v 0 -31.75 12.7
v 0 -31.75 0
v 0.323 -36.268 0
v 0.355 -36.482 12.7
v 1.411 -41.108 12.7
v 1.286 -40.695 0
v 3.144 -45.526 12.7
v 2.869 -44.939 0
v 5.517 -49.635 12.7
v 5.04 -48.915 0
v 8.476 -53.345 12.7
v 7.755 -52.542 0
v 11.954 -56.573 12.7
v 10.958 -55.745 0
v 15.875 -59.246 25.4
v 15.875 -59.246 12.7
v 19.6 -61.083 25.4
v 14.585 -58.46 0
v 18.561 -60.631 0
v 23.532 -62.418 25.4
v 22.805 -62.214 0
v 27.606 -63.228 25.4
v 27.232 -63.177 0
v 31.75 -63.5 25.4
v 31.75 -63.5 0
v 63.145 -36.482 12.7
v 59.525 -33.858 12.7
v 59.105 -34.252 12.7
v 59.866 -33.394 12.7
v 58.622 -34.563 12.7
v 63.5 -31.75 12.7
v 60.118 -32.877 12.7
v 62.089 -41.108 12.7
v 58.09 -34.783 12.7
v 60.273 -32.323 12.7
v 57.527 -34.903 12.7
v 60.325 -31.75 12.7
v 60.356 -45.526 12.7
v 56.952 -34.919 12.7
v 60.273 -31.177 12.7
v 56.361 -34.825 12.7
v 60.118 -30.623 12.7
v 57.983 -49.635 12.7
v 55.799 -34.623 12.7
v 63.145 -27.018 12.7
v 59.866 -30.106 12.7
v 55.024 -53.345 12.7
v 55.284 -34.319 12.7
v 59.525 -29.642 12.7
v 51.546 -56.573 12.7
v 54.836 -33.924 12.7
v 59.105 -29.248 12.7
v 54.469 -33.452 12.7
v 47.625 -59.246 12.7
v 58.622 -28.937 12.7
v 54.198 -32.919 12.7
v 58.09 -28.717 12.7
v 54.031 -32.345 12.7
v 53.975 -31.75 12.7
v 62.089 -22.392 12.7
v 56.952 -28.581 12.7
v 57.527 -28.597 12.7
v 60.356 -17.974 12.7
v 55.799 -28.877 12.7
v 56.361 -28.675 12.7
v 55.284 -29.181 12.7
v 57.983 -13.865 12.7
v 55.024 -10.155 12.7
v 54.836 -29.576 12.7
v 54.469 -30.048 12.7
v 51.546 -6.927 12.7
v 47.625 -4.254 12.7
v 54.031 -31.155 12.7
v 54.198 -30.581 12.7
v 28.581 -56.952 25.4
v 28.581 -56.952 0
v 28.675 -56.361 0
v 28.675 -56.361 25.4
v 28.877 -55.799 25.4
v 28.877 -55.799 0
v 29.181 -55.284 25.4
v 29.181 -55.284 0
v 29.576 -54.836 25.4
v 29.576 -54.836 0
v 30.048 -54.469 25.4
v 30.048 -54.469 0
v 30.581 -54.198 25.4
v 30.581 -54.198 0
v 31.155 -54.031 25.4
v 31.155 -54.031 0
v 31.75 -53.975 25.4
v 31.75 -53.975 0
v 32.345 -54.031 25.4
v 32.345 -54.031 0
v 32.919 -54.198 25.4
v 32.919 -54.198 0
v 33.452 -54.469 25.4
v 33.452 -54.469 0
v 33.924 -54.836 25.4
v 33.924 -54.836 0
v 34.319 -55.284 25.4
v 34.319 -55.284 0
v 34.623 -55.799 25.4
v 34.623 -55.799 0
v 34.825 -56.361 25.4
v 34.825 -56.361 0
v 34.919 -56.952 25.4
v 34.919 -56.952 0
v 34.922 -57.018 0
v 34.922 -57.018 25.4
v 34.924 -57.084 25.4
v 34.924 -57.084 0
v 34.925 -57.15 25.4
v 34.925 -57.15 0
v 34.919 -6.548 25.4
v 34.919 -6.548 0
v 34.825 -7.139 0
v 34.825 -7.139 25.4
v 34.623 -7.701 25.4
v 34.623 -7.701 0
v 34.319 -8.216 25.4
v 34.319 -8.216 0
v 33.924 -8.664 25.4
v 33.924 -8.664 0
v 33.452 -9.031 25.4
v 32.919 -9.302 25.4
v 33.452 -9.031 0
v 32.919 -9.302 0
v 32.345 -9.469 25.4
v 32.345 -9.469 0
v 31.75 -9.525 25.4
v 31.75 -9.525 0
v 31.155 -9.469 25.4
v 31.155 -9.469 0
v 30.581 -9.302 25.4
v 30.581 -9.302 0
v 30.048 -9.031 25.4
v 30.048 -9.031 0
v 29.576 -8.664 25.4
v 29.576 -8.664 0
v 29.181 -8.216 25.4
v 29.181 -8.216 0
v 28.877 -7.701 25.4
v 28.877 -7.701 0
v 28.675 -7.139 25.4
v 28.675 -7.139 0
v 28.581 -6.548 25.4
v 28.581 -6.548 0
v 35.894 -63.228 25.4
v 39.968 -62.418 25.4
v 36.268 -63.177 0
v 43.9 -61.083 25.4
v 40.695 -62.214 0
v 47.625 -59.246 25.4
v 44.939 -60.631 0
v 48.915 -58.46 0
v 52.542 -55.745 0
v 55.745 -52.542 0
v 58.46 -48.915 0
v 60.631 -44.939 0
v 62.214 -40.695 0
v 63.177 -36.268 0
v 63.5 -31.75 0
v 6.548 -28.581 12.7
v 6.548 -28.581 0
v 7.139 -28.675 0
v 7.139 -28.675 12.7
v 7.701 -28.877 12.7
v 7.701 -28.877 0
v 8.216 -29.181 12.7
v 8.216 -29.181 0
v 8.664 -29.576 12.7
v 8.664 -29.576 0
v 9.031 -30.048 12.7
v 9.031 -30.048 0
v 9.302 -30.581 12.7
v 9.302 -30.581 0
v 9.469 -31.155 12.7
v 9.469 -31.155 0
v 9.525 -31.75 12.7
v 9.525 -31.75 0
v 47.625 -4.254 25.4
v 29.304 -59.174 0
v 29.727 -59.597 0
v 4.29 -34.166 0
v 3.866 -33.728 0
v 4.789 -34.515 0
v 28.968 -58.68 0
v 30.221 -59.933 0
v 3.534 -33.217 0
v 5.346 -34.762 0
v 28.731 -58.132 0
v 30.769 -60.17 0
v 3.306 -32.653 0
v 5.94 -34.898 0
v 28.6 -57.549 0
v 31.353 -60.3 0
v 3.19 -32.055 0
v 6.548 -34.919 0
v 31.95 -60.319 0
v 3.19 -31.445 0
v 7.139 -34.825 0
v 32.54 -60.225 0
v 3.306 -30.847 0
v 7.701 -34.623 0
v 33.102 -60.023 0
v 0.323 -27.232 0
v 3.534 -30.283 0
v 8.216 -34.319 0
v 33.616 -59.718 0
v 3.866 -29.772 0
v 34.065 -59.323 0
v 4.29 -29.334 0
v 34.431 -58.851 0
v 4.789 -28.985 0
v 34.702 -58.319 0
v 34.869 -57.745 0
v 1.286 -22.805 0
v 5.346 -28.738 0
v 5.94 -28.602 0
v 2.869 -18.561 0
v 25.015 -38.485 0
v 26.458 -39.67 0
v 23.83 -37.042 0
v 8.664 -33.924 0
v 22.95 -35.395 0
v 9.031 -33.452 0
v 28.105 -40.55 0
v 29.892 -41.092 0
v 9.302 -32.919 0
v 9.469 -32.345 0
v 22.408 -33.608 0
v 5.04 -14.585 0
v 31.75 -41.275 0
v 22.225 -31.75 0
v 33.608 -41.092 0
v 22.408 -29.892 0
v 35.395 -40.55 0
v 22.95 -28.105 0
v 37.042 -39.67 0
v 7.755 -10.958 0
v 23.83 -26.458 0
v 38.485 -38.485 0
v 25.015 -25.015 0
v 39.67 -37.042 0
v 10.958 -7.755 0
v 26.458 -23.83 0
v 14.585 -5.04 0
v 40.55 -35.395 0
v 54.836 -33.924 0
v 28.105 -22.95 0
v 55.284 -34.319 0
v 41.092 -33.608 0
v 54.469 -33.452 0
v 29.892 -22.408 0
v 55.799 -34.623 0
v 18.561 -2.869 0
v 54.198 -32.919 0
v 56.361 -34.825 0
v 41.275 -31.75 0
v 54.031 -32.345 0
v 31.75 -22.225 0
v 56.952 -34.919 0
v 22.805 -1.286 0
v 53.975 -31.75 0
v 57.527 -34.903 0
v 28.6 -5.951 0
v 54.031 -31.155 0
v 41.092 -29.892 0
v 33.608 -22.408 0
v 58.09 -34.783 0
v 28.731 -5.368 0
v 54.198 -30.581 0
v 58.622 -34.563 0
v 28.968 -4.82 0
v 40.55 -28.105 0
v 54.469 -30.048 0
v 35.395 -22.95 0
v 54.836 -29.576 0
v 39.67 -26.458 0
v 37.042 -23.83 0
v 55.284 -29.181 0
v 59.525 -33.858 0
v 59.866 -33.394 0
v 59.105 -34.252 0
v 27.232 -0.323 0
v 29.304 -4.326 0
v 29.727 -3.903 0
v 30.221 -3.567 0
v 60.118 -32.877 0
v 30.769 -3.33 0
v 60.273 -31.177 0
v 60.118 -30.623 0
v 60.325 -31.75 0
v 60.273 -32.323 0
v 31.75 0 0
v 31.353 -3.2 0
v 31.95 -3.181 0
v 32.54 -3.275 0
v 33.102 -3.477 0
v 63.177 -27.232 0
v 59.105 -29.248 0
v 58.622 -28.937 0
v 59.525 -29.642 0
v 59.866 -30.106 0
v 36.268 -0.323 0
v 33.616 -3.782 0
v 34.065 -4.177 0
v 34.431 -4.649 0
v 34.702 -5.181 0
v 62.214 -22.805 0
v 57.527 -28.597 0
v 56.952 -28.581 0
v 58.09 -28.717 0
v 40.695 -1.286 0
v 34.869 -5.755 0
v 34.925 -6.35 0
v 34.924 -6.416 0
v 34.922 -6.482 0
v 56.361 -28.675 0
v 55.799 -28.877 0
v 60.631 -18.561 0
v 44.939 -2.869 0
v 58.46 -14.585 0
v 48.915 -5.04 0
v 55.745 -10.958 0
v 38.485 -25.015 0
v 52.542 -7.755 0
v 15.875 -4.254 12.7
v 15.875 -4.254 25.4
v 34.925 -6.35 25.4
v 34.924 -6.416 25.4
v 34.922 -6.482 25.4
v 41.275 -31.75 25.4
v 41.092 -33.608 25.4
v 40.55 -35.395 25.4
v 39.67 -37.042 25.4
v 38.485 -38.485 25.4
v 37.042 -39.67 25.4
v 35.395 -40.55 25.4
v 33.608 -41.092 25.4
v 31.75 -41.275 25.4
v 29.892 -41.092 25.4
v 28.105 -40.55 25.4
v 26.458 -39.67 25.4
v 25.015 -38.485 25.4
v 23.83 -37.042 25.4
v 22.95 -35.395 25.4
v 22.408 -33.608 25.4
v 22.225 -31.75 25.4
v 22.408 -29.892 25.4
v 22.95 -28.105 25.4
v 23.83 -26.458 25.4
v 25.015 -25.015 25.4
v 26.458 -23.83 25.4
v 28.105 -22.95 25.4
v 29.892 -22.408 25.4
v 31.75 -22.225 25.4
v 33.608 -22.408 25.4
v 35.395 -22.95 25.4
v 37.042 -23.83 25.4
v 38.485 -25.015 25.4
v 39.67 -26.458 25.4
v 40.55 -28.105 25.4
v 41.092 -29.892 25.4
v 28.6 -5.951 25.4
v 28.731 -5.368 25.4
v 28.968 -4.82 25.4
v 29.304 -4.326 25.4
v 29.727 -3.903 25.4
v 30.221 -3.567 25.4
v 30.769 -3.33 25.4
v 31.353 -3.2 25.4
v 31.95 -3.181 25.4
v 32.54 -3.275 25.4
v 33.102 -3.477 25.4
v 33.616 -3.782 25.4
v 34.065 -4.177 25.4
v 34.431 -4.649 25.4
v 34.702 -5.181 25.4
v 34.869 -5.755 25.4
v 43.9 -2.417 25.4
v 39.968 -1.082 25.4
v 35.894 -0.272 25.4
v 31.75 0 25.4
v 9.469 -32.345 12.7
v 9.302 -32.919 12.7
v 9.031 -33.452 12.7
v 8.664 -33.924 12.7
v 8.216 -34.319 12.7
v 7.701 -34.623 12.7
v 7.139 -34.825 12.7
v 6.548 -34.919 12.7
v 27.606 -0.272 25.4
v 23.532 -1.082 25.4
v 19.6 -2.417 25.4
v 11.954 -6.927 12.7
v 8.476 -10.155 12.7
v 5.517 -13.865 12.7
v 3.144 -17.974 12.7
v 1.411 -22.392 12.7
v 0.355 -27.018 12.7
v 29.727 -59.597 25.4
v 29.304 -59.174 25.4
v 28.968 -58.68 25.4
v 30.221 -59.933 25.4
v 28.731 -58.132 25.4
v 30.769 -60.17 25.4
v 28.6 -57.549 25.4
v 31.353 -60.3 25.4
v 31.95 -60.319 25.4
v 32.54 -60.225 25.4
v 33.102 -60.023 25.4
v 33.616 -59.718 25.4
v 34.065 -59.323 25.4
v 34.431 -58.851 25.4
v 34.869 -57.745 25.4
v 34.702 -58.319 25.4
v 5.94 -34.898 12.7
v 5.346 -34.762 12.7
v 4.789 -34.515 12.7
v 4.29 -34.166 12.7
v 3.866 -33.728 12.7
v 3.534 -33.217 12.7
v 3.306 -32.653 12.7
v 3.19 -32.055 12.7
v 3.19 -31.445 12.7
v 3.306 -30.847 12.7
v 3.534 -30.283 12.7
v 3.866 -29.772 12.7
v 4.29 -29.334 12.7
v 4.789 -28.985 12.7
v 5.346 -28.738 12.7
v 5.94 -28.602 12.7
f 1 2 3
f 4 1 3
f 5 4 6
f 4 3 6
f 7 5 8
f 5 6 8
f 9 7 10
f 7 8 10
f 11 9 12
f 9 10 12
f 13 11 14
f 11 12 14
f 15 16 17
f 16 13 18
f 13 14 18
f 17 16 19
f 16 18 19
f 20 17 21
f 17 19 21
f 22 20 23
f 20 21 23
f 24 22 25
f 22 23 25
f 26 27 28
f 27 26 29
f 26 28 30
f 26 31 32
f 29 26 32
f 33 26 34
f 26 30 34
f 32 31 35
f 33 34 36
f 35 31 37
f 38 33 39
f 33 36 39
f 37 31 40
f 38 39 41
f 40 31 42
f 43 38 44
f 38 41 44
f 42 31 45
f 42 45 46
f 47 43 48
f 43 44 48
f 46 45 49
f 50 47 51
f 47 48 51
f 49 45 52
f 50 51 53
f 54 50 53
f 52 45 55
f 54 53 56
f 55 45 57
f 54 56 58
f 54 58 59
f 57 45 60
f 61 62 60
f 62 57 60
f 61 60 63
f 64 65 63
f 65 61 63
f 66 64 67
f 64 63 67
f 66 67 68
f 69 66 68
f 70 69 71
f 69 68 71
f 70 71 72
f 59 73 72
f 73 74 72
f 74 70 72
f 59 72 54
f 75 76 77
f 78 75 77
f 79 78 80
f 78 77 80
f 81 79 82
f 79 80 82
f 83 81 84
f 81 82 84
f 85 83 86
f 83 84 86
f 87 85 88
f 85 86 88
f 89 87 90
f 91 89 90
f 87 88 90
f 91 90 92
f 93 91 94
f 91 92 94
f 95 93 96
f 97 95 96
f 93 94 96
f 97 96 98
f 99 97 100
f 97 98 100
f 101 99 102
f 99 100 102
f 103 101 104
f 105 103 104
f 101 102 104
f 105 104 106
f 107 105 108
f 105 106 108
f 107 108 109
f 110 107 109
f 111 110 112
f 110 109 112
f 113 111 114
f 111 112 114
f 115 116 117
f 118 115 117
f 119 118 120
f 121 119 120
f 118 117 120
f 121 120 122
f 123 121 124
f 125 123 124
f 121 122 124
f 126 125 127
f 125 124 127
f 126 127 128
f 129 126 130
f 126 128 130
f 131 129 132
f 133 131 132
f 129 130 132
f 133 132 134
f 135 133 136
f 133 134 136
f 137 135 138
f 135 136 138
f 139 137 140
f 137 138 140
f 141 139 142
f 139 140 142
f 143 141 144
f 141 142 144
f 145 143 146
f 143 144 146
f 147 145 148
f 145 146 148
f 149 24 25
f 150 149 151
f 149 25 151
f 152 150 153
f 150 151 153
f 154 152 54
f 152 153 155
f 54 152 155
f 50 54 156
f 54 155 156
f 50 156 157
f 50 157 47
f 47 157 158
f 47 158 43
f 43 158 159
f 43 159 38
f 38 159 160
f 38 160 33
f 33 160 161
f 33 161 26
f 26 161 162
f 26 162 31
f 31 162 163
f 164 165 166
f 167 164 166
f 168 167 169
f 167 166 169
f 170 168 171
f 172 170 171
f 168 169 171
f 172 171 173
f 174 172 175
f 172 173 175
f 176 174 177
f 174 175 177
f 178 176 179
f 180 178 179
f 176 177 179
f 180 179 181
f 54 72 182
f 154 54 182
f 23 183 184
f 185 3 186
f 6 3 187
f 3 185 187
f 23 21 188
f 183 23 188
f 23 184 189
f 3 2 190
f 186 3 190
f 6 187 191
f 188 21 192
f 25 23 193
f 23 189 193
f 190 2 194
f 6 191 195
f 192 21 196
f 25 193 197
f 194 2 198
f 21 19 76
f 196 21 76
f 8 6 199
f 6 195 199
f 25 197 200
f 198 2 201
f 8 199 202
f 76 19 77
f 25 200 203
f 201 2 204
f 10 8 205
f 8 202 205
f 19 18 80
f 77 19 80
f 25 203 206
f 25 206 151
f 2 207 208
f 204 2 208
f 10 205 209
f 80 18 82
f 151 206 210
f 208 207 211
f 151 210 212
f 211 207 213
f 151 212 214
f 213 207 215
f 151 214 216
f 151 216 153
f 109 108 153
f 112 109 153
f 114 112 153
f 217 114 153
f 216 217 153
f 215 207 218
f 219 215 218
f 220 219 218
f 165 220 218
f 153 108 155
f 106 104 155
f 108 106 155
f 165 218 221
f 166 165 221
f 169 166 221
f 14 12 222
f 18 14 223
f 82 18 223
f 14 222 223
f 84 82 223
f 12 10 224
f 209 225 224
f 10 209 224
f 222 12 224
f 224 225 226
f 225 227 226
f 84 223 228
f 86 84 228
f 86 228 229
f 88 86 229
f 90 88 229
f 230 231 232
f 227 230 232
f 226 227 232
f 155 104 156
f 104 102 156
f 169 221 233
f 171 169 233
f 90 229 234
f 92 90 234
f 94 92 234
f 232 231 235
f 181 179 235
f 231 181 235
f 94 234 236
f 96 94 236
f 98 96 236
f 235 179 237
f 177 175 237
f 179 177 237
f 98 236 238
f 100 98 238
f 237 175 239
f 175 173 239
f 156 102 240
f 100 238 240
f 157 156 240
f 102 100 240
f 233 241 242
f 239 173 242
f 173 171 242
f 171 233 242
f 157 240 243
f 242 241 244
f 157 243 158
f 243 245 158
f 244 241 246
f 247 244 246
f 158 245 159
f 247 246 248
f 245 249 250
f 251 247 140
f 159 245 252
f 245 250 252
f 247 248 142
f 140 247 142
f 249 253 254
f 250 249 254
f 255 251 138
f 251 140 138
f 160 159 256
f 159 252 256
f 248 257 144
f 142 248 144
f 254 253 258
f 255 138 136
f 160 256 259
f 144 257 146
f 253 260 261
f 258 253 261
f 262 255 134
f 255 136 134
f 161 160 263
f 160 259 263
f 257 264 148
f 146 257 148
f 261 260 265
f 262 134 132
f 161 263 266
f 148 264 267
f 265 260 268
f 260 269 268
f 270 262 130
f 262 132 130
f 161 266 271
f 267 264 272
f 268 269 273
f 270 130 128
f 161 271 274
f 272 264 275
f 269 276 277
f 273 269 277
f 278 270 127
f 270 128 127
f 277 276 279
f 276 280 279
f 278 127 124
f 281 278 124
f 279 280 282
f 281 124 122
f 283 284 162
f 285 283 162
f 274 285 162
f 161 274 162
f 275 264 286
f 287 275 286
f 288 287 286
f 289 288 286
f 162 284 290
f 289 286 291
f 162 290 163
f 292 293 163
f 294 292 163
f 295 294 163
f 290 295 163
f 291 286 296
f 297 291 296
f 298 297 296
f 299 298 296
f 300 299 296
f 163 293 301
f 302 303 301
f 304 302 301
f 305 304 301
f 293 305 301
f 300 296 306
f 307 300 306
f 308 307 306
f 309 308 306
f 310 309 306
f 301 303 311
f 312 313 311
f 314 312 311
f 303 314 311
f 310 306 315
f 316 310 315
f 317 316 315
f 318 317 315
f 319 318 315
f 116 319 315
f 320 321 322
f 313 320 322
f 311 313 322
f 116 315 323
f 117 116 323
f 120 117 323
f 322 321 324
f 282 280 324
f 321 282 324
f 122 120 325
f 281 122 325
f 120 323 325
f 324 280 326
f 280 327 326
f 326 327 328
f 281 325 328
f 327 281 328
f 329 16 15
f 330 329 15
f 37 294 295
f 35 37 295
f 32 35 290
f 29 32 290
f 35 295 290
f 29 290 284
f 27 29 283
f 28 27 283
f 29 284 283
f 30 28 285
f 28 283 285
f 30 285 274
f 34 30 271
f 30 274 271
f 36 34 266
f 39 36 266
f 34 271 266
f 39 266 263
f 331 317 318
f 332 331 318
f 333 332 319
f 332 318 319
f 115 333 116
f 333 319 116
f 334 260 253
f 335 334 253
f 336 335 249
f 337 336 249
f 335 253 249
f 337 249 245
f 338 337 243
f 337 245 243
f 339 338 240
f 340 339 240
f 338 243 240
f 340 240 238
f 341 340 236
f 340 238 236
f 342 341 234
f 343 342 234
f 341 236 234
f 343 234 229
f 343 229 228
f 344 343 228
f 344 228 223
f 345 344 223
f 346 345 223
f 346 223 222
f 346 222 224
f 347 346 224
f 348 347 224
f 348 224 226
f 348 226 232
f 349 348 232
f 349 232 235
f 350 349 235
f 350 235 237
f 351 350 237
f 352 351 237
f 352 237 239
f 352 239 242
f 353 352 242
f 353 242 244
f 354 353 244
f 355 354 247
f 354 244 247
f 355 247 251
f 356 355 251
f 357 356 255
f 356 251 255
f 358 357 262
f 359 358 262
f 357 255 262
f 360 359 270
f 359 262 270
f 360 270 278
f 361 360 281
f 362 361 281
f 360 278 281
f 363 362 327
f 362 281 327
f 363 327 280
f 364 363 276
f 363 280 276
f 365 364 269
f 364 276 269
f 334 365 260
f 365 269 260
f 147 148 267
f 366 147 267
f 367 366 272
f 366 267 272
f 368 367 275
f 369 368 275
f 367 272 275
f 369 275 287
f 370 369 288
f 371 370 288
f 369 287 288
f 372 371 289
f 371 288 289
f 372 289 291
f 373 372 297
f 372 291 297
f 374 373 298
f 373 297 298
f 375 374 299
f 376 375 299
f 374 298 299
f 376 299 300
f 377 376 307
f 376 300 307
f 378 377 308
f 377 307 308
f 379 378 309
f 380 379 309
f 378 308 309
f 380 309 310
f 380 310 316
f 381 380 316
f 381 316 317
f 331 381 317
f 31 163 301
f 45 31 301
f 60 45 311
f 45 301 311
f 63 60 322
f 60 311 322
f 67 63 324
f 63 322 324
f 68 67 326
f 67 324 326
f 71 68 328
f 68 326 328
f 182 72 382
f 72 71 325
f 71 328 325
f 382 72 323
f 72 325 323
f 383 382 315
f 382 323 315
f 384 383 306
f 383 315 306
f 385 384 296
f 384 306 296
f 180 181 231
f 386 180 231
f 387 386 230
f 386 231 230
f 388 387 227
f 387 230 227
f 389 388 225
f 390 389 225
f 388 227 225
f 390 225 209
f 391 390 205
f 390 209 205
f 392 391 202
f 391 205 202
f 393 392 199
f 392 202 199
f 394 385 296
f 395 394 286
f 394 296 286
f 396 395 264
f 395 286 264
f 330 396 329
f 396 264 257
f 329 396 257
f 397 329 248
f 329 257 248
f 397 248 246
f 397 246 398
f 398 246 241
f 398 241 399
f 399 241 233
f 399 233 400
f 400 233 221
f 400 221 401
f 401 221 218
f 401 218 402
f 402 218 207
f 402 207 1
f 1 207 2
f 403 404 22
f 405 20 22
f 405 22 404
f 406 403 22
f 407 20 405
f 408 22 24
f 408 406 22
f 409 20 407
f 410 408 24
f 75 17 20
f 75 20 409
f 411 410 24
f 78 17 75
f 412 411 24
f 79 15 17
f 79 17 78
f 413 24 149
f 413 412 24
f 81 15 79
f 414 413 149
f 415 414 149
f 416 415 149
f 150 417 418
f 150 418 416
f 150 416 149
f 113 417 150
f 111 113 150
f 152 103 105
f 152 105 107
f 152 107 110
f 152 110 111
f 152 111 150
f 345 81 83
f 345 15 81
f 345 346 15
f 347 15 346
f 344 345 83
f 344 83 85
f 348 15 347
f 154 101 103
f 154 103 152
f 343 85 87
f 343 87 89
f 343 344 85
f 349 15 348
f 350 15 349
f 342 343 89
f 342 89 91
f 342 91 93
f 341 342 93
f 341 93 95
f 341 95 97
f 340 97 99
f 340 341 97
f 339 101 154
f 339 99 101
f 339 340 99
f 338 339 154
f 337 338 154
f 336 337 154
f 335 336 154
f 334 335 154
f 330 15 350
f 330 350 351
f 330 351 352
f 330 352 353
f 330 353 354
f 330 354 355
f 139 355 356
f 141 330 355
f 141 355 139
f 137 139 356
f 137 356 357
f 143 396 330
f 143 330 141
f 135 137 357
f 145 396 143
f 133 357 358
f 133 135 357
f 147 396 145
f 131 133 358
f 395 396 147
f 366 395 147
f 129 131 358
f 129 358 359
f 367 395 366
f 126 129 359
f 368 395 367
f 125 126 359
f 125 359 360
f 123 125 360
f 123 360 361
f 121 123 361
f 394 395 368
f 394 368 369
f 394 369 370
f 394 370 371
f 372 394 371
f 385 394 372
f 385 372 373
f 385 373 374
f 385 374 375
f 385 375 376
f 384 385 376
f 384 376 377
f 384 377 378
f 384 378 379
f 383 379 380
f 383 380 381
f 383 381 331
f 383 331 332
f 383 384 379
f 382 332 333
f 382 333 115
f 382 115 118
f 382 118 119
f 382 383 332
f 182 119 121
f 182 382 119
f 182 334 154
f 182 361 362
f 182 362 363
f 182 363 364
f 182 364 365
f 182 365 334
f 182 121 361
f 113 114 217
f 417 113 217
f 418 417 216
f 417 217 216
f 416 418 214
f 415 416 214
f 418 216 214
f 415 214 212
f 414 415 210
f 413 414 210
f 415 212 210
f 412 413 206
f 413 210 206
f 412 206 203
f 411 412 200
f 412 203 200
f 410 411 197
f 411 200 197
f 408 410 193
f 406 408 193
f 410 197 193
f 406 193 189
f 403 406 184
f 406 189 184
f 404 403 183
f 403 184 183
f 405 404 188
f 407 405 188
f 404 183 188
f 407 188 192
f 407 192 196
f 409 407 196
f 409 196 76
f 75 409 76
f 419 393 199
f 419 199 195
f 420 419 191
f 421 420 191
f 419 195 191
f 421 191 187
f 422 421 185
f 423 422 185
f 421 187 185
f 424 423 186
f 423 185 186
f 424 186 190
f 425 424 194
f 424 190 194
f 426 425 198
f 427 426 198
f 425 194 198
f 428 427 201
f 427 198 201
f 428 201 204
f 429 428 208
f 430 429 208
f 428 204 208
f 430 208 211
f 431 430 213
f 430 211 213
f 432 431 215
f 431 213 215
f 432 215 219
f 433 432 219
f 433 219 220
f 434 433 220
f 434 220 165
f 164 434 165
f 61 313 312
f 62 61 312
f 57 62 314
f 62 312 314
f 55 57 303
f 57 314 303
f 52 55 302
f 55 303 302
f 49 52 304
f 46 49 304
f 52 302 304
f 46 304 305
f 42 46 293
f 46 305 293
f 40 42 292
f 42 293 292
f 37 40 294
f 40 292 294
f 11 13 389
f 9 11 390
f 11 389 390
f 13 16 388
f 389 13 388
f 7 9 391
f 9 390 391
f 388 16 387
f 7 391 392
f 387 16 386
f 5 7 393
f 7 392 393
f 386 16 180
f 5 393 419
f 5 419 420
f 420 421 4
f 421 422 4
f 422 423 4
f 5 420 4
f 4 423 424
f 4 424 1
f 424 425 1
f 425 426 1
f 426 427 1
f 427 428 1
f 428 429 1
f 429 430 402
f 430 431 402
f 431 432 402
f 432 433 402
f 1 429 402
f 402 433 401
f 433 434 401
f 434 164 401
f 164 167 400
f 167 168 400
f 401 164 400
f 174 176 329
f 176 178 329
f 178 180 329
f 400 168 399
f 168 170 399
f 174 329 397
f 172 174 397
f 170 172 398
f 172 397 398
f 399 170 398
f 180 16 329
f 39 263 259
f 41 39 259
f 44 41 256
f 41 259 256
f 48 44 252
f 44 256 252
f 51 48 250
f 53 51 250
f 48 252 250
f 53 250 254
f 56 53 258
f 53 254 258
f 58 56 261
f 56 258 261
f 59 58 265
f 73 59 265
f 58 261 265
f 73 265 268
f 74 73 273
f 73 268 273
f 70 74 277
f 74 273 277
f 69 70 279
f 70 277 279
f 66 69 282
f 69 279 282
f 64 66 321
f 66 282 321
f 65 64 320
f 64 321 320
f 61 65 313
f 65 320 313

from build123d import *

# Parameters (mm, degrees)
F0_W     = 31.75
F0_H     = 12.7
F1_DEPTH = 63.5
F3_DEPTH = 25.401
F2_R     = 9.525
F4_DEPTH = 25.401


with BuildPart() as f1:
    # F0 (on Front) → F1 (new body)
    with BuildSketch(Plane.XZ):
        Polygon((0, 12.7), (0, 0), (63.5, 0), (63.5, 12.7), (47.625, 12.7), (15.875, 12.7), align=None)
        with Locations((31.75, 19.05)):
            Rectangle(F0_W, F0_H)
    extrude(amount=F1_DEPTH)

    # F2 (on face) → F3 (cut, through all)
    with BuildSketch(Plane(origin=(0, 0, 0), x_dir=(1, 0, 0), z_dir=(0, 0, -1))):
        with BuildLine():
            ThreePointArc((0, 31.75), (9.2993596973, 54.2006403027), (31.75, 63.5))
            Line((31.75, 63.5), (0, 63.5))
            Line((0, 63.5), (0, 31.75))
        make_face()
        with BuildLine():
            ThreePointArc((31.75, 63.5), (54.2006403027, 54.2006403027), (63.5, 31.75))
            Line((63.5, 31.75), (63.5, 63.5))
            Line((63.5, 63.5), (31.75, 63.5))
        make_face()
        with BuildLine():
            Line((0, 0), (31.75, 0))
            ThreePointArc((31.75, 0), (9.2993596973, 9.2993596973), (0, 31.75))
            Line((0, 31.75), (0, 0))
        make_face()
        with BuildLine():
            Line((63.5, 0), (63.5, 31.75))
            ThreePointArc((63.5, 31.75), (54.2006403027, 9.2993596973), (31.75, 0))
            Line((31.75, 0), (63.5, 0))
        make_face()
    extrude(amount=-F3_DEPTH, mode=Mode.SUBTRACT)

    # F2 (on face) → F4 (cut, through all)
    with BuildSketch(Plane(origin=(0, 0, 0), x_dir=(1, 0, 0), z_dir=(0, 0, -1))):
        with BuildLine():
            ThreePointArc((28.5812072396, 56.9515625), (31.75, 57.15), (34.9187927604, 56.9515625))
            ThreePointArc((34.9187927604, 56.9515625), (34.9234478107, 57.0507327204), (34.925, 57.15))
            ThreePointArc((34.925, 57.15), (31.6507327204, 60.3234478107), (28.5812072396, 56.9515625))
        make_face()
        with BuildLine():
            ThreePointArc((28.5812072396, 56.9515625), (31.75, 53.975), (34.9187927604, 56.9515625))
            ThreePointArc((34.9187927604, 56.9515625), (31.75, 57.15), (28.5812072396, 56.9515625))
        make_face()
        with BuildLine():
            ThreePointArc((9.525, 31.75), (8.6641590333, 33.9237739001), (6.5484375, 34.9187927604))
            ThreePointArc((6.5484375, 34.9187927604), (6.35, 31.75), (6.5484375, 28.5812072396))
            ThreePointArc((6.5484375, 28.5812072396), (8.6641590333, 29.5762260999), (9.525, 31.75))
        make_face()
        with BuildLine():
            ThreePointArc((6.5484375, 28.5812072396), (6.35, 31.75), (6.5484375, 34.9187927604))
            ThreePointArc((6.5484375, 34.9187927604), (3.175, 31.75), (6.5484375, 28.5812072396))
        make_face()
        with BuildLine():
            ThreePointArc((34.925, 6.35), (34.9234478107, 6.4492672796), (34.9187927604, 6.5484375))
            ThreePointArc((34.9187927604, 6.5484375), (31.75, 6.35), (28.5812072396, 6.5484375))
            ThreePointArc((28.5812072396, 6.5484375), (31.6507327204, 3.1765521893), (34.925, 6.35))
        make_face()
        with BuildLine():
            ThreePointArc((28.5812072396, 6.5484375), (31.75, 6.35), (34.9187927604, 6.5484375))
            ThreePointArc((34.9187927604, 6.5484375), (31.75, 9.525), (28.5812072396, 6.5484375))
        make_face()
        with BuildLine():
            ThreePointArc((56.9515625, 34.9187927604), (57.1003420835, 33.3375), (57.15, 31.75))
            ThreePointArc((57.15, 31.75), (57.1003420835, 30.1625), (56.9515625, 28.5812072396))
            ThreePointArc((56.9515625, 28.5812072396), (59.3237739001, 29.4358409667), (60.325, 31.75))
            ThreePointArc((60.325, 31.75), (59.3237739001, 34.0641590333), (56.9515625, 34.9187927604))
        make_face()
        with BuildLine():
            ThreePointArc((56.9515625, 28.5812072396), (57.1003420835, 30.1625), (57.15, 31.75))
            ThreePointArc((57.15, 31.75), (57.1003420835, 33.3375), (56.9515625, 34.9187927604))
            ThreePointArc((56.9515625, 34.9187927604), (53.975, 31.75), (56.9515625, 28.5812072396))
        make_face()
        with Locations((31.75, 31.75)):
            Circle(F2_R)
    extrude(amount=-F4_DEPTH, mode=Mode.SUBTRACT)


solid = f1.part
